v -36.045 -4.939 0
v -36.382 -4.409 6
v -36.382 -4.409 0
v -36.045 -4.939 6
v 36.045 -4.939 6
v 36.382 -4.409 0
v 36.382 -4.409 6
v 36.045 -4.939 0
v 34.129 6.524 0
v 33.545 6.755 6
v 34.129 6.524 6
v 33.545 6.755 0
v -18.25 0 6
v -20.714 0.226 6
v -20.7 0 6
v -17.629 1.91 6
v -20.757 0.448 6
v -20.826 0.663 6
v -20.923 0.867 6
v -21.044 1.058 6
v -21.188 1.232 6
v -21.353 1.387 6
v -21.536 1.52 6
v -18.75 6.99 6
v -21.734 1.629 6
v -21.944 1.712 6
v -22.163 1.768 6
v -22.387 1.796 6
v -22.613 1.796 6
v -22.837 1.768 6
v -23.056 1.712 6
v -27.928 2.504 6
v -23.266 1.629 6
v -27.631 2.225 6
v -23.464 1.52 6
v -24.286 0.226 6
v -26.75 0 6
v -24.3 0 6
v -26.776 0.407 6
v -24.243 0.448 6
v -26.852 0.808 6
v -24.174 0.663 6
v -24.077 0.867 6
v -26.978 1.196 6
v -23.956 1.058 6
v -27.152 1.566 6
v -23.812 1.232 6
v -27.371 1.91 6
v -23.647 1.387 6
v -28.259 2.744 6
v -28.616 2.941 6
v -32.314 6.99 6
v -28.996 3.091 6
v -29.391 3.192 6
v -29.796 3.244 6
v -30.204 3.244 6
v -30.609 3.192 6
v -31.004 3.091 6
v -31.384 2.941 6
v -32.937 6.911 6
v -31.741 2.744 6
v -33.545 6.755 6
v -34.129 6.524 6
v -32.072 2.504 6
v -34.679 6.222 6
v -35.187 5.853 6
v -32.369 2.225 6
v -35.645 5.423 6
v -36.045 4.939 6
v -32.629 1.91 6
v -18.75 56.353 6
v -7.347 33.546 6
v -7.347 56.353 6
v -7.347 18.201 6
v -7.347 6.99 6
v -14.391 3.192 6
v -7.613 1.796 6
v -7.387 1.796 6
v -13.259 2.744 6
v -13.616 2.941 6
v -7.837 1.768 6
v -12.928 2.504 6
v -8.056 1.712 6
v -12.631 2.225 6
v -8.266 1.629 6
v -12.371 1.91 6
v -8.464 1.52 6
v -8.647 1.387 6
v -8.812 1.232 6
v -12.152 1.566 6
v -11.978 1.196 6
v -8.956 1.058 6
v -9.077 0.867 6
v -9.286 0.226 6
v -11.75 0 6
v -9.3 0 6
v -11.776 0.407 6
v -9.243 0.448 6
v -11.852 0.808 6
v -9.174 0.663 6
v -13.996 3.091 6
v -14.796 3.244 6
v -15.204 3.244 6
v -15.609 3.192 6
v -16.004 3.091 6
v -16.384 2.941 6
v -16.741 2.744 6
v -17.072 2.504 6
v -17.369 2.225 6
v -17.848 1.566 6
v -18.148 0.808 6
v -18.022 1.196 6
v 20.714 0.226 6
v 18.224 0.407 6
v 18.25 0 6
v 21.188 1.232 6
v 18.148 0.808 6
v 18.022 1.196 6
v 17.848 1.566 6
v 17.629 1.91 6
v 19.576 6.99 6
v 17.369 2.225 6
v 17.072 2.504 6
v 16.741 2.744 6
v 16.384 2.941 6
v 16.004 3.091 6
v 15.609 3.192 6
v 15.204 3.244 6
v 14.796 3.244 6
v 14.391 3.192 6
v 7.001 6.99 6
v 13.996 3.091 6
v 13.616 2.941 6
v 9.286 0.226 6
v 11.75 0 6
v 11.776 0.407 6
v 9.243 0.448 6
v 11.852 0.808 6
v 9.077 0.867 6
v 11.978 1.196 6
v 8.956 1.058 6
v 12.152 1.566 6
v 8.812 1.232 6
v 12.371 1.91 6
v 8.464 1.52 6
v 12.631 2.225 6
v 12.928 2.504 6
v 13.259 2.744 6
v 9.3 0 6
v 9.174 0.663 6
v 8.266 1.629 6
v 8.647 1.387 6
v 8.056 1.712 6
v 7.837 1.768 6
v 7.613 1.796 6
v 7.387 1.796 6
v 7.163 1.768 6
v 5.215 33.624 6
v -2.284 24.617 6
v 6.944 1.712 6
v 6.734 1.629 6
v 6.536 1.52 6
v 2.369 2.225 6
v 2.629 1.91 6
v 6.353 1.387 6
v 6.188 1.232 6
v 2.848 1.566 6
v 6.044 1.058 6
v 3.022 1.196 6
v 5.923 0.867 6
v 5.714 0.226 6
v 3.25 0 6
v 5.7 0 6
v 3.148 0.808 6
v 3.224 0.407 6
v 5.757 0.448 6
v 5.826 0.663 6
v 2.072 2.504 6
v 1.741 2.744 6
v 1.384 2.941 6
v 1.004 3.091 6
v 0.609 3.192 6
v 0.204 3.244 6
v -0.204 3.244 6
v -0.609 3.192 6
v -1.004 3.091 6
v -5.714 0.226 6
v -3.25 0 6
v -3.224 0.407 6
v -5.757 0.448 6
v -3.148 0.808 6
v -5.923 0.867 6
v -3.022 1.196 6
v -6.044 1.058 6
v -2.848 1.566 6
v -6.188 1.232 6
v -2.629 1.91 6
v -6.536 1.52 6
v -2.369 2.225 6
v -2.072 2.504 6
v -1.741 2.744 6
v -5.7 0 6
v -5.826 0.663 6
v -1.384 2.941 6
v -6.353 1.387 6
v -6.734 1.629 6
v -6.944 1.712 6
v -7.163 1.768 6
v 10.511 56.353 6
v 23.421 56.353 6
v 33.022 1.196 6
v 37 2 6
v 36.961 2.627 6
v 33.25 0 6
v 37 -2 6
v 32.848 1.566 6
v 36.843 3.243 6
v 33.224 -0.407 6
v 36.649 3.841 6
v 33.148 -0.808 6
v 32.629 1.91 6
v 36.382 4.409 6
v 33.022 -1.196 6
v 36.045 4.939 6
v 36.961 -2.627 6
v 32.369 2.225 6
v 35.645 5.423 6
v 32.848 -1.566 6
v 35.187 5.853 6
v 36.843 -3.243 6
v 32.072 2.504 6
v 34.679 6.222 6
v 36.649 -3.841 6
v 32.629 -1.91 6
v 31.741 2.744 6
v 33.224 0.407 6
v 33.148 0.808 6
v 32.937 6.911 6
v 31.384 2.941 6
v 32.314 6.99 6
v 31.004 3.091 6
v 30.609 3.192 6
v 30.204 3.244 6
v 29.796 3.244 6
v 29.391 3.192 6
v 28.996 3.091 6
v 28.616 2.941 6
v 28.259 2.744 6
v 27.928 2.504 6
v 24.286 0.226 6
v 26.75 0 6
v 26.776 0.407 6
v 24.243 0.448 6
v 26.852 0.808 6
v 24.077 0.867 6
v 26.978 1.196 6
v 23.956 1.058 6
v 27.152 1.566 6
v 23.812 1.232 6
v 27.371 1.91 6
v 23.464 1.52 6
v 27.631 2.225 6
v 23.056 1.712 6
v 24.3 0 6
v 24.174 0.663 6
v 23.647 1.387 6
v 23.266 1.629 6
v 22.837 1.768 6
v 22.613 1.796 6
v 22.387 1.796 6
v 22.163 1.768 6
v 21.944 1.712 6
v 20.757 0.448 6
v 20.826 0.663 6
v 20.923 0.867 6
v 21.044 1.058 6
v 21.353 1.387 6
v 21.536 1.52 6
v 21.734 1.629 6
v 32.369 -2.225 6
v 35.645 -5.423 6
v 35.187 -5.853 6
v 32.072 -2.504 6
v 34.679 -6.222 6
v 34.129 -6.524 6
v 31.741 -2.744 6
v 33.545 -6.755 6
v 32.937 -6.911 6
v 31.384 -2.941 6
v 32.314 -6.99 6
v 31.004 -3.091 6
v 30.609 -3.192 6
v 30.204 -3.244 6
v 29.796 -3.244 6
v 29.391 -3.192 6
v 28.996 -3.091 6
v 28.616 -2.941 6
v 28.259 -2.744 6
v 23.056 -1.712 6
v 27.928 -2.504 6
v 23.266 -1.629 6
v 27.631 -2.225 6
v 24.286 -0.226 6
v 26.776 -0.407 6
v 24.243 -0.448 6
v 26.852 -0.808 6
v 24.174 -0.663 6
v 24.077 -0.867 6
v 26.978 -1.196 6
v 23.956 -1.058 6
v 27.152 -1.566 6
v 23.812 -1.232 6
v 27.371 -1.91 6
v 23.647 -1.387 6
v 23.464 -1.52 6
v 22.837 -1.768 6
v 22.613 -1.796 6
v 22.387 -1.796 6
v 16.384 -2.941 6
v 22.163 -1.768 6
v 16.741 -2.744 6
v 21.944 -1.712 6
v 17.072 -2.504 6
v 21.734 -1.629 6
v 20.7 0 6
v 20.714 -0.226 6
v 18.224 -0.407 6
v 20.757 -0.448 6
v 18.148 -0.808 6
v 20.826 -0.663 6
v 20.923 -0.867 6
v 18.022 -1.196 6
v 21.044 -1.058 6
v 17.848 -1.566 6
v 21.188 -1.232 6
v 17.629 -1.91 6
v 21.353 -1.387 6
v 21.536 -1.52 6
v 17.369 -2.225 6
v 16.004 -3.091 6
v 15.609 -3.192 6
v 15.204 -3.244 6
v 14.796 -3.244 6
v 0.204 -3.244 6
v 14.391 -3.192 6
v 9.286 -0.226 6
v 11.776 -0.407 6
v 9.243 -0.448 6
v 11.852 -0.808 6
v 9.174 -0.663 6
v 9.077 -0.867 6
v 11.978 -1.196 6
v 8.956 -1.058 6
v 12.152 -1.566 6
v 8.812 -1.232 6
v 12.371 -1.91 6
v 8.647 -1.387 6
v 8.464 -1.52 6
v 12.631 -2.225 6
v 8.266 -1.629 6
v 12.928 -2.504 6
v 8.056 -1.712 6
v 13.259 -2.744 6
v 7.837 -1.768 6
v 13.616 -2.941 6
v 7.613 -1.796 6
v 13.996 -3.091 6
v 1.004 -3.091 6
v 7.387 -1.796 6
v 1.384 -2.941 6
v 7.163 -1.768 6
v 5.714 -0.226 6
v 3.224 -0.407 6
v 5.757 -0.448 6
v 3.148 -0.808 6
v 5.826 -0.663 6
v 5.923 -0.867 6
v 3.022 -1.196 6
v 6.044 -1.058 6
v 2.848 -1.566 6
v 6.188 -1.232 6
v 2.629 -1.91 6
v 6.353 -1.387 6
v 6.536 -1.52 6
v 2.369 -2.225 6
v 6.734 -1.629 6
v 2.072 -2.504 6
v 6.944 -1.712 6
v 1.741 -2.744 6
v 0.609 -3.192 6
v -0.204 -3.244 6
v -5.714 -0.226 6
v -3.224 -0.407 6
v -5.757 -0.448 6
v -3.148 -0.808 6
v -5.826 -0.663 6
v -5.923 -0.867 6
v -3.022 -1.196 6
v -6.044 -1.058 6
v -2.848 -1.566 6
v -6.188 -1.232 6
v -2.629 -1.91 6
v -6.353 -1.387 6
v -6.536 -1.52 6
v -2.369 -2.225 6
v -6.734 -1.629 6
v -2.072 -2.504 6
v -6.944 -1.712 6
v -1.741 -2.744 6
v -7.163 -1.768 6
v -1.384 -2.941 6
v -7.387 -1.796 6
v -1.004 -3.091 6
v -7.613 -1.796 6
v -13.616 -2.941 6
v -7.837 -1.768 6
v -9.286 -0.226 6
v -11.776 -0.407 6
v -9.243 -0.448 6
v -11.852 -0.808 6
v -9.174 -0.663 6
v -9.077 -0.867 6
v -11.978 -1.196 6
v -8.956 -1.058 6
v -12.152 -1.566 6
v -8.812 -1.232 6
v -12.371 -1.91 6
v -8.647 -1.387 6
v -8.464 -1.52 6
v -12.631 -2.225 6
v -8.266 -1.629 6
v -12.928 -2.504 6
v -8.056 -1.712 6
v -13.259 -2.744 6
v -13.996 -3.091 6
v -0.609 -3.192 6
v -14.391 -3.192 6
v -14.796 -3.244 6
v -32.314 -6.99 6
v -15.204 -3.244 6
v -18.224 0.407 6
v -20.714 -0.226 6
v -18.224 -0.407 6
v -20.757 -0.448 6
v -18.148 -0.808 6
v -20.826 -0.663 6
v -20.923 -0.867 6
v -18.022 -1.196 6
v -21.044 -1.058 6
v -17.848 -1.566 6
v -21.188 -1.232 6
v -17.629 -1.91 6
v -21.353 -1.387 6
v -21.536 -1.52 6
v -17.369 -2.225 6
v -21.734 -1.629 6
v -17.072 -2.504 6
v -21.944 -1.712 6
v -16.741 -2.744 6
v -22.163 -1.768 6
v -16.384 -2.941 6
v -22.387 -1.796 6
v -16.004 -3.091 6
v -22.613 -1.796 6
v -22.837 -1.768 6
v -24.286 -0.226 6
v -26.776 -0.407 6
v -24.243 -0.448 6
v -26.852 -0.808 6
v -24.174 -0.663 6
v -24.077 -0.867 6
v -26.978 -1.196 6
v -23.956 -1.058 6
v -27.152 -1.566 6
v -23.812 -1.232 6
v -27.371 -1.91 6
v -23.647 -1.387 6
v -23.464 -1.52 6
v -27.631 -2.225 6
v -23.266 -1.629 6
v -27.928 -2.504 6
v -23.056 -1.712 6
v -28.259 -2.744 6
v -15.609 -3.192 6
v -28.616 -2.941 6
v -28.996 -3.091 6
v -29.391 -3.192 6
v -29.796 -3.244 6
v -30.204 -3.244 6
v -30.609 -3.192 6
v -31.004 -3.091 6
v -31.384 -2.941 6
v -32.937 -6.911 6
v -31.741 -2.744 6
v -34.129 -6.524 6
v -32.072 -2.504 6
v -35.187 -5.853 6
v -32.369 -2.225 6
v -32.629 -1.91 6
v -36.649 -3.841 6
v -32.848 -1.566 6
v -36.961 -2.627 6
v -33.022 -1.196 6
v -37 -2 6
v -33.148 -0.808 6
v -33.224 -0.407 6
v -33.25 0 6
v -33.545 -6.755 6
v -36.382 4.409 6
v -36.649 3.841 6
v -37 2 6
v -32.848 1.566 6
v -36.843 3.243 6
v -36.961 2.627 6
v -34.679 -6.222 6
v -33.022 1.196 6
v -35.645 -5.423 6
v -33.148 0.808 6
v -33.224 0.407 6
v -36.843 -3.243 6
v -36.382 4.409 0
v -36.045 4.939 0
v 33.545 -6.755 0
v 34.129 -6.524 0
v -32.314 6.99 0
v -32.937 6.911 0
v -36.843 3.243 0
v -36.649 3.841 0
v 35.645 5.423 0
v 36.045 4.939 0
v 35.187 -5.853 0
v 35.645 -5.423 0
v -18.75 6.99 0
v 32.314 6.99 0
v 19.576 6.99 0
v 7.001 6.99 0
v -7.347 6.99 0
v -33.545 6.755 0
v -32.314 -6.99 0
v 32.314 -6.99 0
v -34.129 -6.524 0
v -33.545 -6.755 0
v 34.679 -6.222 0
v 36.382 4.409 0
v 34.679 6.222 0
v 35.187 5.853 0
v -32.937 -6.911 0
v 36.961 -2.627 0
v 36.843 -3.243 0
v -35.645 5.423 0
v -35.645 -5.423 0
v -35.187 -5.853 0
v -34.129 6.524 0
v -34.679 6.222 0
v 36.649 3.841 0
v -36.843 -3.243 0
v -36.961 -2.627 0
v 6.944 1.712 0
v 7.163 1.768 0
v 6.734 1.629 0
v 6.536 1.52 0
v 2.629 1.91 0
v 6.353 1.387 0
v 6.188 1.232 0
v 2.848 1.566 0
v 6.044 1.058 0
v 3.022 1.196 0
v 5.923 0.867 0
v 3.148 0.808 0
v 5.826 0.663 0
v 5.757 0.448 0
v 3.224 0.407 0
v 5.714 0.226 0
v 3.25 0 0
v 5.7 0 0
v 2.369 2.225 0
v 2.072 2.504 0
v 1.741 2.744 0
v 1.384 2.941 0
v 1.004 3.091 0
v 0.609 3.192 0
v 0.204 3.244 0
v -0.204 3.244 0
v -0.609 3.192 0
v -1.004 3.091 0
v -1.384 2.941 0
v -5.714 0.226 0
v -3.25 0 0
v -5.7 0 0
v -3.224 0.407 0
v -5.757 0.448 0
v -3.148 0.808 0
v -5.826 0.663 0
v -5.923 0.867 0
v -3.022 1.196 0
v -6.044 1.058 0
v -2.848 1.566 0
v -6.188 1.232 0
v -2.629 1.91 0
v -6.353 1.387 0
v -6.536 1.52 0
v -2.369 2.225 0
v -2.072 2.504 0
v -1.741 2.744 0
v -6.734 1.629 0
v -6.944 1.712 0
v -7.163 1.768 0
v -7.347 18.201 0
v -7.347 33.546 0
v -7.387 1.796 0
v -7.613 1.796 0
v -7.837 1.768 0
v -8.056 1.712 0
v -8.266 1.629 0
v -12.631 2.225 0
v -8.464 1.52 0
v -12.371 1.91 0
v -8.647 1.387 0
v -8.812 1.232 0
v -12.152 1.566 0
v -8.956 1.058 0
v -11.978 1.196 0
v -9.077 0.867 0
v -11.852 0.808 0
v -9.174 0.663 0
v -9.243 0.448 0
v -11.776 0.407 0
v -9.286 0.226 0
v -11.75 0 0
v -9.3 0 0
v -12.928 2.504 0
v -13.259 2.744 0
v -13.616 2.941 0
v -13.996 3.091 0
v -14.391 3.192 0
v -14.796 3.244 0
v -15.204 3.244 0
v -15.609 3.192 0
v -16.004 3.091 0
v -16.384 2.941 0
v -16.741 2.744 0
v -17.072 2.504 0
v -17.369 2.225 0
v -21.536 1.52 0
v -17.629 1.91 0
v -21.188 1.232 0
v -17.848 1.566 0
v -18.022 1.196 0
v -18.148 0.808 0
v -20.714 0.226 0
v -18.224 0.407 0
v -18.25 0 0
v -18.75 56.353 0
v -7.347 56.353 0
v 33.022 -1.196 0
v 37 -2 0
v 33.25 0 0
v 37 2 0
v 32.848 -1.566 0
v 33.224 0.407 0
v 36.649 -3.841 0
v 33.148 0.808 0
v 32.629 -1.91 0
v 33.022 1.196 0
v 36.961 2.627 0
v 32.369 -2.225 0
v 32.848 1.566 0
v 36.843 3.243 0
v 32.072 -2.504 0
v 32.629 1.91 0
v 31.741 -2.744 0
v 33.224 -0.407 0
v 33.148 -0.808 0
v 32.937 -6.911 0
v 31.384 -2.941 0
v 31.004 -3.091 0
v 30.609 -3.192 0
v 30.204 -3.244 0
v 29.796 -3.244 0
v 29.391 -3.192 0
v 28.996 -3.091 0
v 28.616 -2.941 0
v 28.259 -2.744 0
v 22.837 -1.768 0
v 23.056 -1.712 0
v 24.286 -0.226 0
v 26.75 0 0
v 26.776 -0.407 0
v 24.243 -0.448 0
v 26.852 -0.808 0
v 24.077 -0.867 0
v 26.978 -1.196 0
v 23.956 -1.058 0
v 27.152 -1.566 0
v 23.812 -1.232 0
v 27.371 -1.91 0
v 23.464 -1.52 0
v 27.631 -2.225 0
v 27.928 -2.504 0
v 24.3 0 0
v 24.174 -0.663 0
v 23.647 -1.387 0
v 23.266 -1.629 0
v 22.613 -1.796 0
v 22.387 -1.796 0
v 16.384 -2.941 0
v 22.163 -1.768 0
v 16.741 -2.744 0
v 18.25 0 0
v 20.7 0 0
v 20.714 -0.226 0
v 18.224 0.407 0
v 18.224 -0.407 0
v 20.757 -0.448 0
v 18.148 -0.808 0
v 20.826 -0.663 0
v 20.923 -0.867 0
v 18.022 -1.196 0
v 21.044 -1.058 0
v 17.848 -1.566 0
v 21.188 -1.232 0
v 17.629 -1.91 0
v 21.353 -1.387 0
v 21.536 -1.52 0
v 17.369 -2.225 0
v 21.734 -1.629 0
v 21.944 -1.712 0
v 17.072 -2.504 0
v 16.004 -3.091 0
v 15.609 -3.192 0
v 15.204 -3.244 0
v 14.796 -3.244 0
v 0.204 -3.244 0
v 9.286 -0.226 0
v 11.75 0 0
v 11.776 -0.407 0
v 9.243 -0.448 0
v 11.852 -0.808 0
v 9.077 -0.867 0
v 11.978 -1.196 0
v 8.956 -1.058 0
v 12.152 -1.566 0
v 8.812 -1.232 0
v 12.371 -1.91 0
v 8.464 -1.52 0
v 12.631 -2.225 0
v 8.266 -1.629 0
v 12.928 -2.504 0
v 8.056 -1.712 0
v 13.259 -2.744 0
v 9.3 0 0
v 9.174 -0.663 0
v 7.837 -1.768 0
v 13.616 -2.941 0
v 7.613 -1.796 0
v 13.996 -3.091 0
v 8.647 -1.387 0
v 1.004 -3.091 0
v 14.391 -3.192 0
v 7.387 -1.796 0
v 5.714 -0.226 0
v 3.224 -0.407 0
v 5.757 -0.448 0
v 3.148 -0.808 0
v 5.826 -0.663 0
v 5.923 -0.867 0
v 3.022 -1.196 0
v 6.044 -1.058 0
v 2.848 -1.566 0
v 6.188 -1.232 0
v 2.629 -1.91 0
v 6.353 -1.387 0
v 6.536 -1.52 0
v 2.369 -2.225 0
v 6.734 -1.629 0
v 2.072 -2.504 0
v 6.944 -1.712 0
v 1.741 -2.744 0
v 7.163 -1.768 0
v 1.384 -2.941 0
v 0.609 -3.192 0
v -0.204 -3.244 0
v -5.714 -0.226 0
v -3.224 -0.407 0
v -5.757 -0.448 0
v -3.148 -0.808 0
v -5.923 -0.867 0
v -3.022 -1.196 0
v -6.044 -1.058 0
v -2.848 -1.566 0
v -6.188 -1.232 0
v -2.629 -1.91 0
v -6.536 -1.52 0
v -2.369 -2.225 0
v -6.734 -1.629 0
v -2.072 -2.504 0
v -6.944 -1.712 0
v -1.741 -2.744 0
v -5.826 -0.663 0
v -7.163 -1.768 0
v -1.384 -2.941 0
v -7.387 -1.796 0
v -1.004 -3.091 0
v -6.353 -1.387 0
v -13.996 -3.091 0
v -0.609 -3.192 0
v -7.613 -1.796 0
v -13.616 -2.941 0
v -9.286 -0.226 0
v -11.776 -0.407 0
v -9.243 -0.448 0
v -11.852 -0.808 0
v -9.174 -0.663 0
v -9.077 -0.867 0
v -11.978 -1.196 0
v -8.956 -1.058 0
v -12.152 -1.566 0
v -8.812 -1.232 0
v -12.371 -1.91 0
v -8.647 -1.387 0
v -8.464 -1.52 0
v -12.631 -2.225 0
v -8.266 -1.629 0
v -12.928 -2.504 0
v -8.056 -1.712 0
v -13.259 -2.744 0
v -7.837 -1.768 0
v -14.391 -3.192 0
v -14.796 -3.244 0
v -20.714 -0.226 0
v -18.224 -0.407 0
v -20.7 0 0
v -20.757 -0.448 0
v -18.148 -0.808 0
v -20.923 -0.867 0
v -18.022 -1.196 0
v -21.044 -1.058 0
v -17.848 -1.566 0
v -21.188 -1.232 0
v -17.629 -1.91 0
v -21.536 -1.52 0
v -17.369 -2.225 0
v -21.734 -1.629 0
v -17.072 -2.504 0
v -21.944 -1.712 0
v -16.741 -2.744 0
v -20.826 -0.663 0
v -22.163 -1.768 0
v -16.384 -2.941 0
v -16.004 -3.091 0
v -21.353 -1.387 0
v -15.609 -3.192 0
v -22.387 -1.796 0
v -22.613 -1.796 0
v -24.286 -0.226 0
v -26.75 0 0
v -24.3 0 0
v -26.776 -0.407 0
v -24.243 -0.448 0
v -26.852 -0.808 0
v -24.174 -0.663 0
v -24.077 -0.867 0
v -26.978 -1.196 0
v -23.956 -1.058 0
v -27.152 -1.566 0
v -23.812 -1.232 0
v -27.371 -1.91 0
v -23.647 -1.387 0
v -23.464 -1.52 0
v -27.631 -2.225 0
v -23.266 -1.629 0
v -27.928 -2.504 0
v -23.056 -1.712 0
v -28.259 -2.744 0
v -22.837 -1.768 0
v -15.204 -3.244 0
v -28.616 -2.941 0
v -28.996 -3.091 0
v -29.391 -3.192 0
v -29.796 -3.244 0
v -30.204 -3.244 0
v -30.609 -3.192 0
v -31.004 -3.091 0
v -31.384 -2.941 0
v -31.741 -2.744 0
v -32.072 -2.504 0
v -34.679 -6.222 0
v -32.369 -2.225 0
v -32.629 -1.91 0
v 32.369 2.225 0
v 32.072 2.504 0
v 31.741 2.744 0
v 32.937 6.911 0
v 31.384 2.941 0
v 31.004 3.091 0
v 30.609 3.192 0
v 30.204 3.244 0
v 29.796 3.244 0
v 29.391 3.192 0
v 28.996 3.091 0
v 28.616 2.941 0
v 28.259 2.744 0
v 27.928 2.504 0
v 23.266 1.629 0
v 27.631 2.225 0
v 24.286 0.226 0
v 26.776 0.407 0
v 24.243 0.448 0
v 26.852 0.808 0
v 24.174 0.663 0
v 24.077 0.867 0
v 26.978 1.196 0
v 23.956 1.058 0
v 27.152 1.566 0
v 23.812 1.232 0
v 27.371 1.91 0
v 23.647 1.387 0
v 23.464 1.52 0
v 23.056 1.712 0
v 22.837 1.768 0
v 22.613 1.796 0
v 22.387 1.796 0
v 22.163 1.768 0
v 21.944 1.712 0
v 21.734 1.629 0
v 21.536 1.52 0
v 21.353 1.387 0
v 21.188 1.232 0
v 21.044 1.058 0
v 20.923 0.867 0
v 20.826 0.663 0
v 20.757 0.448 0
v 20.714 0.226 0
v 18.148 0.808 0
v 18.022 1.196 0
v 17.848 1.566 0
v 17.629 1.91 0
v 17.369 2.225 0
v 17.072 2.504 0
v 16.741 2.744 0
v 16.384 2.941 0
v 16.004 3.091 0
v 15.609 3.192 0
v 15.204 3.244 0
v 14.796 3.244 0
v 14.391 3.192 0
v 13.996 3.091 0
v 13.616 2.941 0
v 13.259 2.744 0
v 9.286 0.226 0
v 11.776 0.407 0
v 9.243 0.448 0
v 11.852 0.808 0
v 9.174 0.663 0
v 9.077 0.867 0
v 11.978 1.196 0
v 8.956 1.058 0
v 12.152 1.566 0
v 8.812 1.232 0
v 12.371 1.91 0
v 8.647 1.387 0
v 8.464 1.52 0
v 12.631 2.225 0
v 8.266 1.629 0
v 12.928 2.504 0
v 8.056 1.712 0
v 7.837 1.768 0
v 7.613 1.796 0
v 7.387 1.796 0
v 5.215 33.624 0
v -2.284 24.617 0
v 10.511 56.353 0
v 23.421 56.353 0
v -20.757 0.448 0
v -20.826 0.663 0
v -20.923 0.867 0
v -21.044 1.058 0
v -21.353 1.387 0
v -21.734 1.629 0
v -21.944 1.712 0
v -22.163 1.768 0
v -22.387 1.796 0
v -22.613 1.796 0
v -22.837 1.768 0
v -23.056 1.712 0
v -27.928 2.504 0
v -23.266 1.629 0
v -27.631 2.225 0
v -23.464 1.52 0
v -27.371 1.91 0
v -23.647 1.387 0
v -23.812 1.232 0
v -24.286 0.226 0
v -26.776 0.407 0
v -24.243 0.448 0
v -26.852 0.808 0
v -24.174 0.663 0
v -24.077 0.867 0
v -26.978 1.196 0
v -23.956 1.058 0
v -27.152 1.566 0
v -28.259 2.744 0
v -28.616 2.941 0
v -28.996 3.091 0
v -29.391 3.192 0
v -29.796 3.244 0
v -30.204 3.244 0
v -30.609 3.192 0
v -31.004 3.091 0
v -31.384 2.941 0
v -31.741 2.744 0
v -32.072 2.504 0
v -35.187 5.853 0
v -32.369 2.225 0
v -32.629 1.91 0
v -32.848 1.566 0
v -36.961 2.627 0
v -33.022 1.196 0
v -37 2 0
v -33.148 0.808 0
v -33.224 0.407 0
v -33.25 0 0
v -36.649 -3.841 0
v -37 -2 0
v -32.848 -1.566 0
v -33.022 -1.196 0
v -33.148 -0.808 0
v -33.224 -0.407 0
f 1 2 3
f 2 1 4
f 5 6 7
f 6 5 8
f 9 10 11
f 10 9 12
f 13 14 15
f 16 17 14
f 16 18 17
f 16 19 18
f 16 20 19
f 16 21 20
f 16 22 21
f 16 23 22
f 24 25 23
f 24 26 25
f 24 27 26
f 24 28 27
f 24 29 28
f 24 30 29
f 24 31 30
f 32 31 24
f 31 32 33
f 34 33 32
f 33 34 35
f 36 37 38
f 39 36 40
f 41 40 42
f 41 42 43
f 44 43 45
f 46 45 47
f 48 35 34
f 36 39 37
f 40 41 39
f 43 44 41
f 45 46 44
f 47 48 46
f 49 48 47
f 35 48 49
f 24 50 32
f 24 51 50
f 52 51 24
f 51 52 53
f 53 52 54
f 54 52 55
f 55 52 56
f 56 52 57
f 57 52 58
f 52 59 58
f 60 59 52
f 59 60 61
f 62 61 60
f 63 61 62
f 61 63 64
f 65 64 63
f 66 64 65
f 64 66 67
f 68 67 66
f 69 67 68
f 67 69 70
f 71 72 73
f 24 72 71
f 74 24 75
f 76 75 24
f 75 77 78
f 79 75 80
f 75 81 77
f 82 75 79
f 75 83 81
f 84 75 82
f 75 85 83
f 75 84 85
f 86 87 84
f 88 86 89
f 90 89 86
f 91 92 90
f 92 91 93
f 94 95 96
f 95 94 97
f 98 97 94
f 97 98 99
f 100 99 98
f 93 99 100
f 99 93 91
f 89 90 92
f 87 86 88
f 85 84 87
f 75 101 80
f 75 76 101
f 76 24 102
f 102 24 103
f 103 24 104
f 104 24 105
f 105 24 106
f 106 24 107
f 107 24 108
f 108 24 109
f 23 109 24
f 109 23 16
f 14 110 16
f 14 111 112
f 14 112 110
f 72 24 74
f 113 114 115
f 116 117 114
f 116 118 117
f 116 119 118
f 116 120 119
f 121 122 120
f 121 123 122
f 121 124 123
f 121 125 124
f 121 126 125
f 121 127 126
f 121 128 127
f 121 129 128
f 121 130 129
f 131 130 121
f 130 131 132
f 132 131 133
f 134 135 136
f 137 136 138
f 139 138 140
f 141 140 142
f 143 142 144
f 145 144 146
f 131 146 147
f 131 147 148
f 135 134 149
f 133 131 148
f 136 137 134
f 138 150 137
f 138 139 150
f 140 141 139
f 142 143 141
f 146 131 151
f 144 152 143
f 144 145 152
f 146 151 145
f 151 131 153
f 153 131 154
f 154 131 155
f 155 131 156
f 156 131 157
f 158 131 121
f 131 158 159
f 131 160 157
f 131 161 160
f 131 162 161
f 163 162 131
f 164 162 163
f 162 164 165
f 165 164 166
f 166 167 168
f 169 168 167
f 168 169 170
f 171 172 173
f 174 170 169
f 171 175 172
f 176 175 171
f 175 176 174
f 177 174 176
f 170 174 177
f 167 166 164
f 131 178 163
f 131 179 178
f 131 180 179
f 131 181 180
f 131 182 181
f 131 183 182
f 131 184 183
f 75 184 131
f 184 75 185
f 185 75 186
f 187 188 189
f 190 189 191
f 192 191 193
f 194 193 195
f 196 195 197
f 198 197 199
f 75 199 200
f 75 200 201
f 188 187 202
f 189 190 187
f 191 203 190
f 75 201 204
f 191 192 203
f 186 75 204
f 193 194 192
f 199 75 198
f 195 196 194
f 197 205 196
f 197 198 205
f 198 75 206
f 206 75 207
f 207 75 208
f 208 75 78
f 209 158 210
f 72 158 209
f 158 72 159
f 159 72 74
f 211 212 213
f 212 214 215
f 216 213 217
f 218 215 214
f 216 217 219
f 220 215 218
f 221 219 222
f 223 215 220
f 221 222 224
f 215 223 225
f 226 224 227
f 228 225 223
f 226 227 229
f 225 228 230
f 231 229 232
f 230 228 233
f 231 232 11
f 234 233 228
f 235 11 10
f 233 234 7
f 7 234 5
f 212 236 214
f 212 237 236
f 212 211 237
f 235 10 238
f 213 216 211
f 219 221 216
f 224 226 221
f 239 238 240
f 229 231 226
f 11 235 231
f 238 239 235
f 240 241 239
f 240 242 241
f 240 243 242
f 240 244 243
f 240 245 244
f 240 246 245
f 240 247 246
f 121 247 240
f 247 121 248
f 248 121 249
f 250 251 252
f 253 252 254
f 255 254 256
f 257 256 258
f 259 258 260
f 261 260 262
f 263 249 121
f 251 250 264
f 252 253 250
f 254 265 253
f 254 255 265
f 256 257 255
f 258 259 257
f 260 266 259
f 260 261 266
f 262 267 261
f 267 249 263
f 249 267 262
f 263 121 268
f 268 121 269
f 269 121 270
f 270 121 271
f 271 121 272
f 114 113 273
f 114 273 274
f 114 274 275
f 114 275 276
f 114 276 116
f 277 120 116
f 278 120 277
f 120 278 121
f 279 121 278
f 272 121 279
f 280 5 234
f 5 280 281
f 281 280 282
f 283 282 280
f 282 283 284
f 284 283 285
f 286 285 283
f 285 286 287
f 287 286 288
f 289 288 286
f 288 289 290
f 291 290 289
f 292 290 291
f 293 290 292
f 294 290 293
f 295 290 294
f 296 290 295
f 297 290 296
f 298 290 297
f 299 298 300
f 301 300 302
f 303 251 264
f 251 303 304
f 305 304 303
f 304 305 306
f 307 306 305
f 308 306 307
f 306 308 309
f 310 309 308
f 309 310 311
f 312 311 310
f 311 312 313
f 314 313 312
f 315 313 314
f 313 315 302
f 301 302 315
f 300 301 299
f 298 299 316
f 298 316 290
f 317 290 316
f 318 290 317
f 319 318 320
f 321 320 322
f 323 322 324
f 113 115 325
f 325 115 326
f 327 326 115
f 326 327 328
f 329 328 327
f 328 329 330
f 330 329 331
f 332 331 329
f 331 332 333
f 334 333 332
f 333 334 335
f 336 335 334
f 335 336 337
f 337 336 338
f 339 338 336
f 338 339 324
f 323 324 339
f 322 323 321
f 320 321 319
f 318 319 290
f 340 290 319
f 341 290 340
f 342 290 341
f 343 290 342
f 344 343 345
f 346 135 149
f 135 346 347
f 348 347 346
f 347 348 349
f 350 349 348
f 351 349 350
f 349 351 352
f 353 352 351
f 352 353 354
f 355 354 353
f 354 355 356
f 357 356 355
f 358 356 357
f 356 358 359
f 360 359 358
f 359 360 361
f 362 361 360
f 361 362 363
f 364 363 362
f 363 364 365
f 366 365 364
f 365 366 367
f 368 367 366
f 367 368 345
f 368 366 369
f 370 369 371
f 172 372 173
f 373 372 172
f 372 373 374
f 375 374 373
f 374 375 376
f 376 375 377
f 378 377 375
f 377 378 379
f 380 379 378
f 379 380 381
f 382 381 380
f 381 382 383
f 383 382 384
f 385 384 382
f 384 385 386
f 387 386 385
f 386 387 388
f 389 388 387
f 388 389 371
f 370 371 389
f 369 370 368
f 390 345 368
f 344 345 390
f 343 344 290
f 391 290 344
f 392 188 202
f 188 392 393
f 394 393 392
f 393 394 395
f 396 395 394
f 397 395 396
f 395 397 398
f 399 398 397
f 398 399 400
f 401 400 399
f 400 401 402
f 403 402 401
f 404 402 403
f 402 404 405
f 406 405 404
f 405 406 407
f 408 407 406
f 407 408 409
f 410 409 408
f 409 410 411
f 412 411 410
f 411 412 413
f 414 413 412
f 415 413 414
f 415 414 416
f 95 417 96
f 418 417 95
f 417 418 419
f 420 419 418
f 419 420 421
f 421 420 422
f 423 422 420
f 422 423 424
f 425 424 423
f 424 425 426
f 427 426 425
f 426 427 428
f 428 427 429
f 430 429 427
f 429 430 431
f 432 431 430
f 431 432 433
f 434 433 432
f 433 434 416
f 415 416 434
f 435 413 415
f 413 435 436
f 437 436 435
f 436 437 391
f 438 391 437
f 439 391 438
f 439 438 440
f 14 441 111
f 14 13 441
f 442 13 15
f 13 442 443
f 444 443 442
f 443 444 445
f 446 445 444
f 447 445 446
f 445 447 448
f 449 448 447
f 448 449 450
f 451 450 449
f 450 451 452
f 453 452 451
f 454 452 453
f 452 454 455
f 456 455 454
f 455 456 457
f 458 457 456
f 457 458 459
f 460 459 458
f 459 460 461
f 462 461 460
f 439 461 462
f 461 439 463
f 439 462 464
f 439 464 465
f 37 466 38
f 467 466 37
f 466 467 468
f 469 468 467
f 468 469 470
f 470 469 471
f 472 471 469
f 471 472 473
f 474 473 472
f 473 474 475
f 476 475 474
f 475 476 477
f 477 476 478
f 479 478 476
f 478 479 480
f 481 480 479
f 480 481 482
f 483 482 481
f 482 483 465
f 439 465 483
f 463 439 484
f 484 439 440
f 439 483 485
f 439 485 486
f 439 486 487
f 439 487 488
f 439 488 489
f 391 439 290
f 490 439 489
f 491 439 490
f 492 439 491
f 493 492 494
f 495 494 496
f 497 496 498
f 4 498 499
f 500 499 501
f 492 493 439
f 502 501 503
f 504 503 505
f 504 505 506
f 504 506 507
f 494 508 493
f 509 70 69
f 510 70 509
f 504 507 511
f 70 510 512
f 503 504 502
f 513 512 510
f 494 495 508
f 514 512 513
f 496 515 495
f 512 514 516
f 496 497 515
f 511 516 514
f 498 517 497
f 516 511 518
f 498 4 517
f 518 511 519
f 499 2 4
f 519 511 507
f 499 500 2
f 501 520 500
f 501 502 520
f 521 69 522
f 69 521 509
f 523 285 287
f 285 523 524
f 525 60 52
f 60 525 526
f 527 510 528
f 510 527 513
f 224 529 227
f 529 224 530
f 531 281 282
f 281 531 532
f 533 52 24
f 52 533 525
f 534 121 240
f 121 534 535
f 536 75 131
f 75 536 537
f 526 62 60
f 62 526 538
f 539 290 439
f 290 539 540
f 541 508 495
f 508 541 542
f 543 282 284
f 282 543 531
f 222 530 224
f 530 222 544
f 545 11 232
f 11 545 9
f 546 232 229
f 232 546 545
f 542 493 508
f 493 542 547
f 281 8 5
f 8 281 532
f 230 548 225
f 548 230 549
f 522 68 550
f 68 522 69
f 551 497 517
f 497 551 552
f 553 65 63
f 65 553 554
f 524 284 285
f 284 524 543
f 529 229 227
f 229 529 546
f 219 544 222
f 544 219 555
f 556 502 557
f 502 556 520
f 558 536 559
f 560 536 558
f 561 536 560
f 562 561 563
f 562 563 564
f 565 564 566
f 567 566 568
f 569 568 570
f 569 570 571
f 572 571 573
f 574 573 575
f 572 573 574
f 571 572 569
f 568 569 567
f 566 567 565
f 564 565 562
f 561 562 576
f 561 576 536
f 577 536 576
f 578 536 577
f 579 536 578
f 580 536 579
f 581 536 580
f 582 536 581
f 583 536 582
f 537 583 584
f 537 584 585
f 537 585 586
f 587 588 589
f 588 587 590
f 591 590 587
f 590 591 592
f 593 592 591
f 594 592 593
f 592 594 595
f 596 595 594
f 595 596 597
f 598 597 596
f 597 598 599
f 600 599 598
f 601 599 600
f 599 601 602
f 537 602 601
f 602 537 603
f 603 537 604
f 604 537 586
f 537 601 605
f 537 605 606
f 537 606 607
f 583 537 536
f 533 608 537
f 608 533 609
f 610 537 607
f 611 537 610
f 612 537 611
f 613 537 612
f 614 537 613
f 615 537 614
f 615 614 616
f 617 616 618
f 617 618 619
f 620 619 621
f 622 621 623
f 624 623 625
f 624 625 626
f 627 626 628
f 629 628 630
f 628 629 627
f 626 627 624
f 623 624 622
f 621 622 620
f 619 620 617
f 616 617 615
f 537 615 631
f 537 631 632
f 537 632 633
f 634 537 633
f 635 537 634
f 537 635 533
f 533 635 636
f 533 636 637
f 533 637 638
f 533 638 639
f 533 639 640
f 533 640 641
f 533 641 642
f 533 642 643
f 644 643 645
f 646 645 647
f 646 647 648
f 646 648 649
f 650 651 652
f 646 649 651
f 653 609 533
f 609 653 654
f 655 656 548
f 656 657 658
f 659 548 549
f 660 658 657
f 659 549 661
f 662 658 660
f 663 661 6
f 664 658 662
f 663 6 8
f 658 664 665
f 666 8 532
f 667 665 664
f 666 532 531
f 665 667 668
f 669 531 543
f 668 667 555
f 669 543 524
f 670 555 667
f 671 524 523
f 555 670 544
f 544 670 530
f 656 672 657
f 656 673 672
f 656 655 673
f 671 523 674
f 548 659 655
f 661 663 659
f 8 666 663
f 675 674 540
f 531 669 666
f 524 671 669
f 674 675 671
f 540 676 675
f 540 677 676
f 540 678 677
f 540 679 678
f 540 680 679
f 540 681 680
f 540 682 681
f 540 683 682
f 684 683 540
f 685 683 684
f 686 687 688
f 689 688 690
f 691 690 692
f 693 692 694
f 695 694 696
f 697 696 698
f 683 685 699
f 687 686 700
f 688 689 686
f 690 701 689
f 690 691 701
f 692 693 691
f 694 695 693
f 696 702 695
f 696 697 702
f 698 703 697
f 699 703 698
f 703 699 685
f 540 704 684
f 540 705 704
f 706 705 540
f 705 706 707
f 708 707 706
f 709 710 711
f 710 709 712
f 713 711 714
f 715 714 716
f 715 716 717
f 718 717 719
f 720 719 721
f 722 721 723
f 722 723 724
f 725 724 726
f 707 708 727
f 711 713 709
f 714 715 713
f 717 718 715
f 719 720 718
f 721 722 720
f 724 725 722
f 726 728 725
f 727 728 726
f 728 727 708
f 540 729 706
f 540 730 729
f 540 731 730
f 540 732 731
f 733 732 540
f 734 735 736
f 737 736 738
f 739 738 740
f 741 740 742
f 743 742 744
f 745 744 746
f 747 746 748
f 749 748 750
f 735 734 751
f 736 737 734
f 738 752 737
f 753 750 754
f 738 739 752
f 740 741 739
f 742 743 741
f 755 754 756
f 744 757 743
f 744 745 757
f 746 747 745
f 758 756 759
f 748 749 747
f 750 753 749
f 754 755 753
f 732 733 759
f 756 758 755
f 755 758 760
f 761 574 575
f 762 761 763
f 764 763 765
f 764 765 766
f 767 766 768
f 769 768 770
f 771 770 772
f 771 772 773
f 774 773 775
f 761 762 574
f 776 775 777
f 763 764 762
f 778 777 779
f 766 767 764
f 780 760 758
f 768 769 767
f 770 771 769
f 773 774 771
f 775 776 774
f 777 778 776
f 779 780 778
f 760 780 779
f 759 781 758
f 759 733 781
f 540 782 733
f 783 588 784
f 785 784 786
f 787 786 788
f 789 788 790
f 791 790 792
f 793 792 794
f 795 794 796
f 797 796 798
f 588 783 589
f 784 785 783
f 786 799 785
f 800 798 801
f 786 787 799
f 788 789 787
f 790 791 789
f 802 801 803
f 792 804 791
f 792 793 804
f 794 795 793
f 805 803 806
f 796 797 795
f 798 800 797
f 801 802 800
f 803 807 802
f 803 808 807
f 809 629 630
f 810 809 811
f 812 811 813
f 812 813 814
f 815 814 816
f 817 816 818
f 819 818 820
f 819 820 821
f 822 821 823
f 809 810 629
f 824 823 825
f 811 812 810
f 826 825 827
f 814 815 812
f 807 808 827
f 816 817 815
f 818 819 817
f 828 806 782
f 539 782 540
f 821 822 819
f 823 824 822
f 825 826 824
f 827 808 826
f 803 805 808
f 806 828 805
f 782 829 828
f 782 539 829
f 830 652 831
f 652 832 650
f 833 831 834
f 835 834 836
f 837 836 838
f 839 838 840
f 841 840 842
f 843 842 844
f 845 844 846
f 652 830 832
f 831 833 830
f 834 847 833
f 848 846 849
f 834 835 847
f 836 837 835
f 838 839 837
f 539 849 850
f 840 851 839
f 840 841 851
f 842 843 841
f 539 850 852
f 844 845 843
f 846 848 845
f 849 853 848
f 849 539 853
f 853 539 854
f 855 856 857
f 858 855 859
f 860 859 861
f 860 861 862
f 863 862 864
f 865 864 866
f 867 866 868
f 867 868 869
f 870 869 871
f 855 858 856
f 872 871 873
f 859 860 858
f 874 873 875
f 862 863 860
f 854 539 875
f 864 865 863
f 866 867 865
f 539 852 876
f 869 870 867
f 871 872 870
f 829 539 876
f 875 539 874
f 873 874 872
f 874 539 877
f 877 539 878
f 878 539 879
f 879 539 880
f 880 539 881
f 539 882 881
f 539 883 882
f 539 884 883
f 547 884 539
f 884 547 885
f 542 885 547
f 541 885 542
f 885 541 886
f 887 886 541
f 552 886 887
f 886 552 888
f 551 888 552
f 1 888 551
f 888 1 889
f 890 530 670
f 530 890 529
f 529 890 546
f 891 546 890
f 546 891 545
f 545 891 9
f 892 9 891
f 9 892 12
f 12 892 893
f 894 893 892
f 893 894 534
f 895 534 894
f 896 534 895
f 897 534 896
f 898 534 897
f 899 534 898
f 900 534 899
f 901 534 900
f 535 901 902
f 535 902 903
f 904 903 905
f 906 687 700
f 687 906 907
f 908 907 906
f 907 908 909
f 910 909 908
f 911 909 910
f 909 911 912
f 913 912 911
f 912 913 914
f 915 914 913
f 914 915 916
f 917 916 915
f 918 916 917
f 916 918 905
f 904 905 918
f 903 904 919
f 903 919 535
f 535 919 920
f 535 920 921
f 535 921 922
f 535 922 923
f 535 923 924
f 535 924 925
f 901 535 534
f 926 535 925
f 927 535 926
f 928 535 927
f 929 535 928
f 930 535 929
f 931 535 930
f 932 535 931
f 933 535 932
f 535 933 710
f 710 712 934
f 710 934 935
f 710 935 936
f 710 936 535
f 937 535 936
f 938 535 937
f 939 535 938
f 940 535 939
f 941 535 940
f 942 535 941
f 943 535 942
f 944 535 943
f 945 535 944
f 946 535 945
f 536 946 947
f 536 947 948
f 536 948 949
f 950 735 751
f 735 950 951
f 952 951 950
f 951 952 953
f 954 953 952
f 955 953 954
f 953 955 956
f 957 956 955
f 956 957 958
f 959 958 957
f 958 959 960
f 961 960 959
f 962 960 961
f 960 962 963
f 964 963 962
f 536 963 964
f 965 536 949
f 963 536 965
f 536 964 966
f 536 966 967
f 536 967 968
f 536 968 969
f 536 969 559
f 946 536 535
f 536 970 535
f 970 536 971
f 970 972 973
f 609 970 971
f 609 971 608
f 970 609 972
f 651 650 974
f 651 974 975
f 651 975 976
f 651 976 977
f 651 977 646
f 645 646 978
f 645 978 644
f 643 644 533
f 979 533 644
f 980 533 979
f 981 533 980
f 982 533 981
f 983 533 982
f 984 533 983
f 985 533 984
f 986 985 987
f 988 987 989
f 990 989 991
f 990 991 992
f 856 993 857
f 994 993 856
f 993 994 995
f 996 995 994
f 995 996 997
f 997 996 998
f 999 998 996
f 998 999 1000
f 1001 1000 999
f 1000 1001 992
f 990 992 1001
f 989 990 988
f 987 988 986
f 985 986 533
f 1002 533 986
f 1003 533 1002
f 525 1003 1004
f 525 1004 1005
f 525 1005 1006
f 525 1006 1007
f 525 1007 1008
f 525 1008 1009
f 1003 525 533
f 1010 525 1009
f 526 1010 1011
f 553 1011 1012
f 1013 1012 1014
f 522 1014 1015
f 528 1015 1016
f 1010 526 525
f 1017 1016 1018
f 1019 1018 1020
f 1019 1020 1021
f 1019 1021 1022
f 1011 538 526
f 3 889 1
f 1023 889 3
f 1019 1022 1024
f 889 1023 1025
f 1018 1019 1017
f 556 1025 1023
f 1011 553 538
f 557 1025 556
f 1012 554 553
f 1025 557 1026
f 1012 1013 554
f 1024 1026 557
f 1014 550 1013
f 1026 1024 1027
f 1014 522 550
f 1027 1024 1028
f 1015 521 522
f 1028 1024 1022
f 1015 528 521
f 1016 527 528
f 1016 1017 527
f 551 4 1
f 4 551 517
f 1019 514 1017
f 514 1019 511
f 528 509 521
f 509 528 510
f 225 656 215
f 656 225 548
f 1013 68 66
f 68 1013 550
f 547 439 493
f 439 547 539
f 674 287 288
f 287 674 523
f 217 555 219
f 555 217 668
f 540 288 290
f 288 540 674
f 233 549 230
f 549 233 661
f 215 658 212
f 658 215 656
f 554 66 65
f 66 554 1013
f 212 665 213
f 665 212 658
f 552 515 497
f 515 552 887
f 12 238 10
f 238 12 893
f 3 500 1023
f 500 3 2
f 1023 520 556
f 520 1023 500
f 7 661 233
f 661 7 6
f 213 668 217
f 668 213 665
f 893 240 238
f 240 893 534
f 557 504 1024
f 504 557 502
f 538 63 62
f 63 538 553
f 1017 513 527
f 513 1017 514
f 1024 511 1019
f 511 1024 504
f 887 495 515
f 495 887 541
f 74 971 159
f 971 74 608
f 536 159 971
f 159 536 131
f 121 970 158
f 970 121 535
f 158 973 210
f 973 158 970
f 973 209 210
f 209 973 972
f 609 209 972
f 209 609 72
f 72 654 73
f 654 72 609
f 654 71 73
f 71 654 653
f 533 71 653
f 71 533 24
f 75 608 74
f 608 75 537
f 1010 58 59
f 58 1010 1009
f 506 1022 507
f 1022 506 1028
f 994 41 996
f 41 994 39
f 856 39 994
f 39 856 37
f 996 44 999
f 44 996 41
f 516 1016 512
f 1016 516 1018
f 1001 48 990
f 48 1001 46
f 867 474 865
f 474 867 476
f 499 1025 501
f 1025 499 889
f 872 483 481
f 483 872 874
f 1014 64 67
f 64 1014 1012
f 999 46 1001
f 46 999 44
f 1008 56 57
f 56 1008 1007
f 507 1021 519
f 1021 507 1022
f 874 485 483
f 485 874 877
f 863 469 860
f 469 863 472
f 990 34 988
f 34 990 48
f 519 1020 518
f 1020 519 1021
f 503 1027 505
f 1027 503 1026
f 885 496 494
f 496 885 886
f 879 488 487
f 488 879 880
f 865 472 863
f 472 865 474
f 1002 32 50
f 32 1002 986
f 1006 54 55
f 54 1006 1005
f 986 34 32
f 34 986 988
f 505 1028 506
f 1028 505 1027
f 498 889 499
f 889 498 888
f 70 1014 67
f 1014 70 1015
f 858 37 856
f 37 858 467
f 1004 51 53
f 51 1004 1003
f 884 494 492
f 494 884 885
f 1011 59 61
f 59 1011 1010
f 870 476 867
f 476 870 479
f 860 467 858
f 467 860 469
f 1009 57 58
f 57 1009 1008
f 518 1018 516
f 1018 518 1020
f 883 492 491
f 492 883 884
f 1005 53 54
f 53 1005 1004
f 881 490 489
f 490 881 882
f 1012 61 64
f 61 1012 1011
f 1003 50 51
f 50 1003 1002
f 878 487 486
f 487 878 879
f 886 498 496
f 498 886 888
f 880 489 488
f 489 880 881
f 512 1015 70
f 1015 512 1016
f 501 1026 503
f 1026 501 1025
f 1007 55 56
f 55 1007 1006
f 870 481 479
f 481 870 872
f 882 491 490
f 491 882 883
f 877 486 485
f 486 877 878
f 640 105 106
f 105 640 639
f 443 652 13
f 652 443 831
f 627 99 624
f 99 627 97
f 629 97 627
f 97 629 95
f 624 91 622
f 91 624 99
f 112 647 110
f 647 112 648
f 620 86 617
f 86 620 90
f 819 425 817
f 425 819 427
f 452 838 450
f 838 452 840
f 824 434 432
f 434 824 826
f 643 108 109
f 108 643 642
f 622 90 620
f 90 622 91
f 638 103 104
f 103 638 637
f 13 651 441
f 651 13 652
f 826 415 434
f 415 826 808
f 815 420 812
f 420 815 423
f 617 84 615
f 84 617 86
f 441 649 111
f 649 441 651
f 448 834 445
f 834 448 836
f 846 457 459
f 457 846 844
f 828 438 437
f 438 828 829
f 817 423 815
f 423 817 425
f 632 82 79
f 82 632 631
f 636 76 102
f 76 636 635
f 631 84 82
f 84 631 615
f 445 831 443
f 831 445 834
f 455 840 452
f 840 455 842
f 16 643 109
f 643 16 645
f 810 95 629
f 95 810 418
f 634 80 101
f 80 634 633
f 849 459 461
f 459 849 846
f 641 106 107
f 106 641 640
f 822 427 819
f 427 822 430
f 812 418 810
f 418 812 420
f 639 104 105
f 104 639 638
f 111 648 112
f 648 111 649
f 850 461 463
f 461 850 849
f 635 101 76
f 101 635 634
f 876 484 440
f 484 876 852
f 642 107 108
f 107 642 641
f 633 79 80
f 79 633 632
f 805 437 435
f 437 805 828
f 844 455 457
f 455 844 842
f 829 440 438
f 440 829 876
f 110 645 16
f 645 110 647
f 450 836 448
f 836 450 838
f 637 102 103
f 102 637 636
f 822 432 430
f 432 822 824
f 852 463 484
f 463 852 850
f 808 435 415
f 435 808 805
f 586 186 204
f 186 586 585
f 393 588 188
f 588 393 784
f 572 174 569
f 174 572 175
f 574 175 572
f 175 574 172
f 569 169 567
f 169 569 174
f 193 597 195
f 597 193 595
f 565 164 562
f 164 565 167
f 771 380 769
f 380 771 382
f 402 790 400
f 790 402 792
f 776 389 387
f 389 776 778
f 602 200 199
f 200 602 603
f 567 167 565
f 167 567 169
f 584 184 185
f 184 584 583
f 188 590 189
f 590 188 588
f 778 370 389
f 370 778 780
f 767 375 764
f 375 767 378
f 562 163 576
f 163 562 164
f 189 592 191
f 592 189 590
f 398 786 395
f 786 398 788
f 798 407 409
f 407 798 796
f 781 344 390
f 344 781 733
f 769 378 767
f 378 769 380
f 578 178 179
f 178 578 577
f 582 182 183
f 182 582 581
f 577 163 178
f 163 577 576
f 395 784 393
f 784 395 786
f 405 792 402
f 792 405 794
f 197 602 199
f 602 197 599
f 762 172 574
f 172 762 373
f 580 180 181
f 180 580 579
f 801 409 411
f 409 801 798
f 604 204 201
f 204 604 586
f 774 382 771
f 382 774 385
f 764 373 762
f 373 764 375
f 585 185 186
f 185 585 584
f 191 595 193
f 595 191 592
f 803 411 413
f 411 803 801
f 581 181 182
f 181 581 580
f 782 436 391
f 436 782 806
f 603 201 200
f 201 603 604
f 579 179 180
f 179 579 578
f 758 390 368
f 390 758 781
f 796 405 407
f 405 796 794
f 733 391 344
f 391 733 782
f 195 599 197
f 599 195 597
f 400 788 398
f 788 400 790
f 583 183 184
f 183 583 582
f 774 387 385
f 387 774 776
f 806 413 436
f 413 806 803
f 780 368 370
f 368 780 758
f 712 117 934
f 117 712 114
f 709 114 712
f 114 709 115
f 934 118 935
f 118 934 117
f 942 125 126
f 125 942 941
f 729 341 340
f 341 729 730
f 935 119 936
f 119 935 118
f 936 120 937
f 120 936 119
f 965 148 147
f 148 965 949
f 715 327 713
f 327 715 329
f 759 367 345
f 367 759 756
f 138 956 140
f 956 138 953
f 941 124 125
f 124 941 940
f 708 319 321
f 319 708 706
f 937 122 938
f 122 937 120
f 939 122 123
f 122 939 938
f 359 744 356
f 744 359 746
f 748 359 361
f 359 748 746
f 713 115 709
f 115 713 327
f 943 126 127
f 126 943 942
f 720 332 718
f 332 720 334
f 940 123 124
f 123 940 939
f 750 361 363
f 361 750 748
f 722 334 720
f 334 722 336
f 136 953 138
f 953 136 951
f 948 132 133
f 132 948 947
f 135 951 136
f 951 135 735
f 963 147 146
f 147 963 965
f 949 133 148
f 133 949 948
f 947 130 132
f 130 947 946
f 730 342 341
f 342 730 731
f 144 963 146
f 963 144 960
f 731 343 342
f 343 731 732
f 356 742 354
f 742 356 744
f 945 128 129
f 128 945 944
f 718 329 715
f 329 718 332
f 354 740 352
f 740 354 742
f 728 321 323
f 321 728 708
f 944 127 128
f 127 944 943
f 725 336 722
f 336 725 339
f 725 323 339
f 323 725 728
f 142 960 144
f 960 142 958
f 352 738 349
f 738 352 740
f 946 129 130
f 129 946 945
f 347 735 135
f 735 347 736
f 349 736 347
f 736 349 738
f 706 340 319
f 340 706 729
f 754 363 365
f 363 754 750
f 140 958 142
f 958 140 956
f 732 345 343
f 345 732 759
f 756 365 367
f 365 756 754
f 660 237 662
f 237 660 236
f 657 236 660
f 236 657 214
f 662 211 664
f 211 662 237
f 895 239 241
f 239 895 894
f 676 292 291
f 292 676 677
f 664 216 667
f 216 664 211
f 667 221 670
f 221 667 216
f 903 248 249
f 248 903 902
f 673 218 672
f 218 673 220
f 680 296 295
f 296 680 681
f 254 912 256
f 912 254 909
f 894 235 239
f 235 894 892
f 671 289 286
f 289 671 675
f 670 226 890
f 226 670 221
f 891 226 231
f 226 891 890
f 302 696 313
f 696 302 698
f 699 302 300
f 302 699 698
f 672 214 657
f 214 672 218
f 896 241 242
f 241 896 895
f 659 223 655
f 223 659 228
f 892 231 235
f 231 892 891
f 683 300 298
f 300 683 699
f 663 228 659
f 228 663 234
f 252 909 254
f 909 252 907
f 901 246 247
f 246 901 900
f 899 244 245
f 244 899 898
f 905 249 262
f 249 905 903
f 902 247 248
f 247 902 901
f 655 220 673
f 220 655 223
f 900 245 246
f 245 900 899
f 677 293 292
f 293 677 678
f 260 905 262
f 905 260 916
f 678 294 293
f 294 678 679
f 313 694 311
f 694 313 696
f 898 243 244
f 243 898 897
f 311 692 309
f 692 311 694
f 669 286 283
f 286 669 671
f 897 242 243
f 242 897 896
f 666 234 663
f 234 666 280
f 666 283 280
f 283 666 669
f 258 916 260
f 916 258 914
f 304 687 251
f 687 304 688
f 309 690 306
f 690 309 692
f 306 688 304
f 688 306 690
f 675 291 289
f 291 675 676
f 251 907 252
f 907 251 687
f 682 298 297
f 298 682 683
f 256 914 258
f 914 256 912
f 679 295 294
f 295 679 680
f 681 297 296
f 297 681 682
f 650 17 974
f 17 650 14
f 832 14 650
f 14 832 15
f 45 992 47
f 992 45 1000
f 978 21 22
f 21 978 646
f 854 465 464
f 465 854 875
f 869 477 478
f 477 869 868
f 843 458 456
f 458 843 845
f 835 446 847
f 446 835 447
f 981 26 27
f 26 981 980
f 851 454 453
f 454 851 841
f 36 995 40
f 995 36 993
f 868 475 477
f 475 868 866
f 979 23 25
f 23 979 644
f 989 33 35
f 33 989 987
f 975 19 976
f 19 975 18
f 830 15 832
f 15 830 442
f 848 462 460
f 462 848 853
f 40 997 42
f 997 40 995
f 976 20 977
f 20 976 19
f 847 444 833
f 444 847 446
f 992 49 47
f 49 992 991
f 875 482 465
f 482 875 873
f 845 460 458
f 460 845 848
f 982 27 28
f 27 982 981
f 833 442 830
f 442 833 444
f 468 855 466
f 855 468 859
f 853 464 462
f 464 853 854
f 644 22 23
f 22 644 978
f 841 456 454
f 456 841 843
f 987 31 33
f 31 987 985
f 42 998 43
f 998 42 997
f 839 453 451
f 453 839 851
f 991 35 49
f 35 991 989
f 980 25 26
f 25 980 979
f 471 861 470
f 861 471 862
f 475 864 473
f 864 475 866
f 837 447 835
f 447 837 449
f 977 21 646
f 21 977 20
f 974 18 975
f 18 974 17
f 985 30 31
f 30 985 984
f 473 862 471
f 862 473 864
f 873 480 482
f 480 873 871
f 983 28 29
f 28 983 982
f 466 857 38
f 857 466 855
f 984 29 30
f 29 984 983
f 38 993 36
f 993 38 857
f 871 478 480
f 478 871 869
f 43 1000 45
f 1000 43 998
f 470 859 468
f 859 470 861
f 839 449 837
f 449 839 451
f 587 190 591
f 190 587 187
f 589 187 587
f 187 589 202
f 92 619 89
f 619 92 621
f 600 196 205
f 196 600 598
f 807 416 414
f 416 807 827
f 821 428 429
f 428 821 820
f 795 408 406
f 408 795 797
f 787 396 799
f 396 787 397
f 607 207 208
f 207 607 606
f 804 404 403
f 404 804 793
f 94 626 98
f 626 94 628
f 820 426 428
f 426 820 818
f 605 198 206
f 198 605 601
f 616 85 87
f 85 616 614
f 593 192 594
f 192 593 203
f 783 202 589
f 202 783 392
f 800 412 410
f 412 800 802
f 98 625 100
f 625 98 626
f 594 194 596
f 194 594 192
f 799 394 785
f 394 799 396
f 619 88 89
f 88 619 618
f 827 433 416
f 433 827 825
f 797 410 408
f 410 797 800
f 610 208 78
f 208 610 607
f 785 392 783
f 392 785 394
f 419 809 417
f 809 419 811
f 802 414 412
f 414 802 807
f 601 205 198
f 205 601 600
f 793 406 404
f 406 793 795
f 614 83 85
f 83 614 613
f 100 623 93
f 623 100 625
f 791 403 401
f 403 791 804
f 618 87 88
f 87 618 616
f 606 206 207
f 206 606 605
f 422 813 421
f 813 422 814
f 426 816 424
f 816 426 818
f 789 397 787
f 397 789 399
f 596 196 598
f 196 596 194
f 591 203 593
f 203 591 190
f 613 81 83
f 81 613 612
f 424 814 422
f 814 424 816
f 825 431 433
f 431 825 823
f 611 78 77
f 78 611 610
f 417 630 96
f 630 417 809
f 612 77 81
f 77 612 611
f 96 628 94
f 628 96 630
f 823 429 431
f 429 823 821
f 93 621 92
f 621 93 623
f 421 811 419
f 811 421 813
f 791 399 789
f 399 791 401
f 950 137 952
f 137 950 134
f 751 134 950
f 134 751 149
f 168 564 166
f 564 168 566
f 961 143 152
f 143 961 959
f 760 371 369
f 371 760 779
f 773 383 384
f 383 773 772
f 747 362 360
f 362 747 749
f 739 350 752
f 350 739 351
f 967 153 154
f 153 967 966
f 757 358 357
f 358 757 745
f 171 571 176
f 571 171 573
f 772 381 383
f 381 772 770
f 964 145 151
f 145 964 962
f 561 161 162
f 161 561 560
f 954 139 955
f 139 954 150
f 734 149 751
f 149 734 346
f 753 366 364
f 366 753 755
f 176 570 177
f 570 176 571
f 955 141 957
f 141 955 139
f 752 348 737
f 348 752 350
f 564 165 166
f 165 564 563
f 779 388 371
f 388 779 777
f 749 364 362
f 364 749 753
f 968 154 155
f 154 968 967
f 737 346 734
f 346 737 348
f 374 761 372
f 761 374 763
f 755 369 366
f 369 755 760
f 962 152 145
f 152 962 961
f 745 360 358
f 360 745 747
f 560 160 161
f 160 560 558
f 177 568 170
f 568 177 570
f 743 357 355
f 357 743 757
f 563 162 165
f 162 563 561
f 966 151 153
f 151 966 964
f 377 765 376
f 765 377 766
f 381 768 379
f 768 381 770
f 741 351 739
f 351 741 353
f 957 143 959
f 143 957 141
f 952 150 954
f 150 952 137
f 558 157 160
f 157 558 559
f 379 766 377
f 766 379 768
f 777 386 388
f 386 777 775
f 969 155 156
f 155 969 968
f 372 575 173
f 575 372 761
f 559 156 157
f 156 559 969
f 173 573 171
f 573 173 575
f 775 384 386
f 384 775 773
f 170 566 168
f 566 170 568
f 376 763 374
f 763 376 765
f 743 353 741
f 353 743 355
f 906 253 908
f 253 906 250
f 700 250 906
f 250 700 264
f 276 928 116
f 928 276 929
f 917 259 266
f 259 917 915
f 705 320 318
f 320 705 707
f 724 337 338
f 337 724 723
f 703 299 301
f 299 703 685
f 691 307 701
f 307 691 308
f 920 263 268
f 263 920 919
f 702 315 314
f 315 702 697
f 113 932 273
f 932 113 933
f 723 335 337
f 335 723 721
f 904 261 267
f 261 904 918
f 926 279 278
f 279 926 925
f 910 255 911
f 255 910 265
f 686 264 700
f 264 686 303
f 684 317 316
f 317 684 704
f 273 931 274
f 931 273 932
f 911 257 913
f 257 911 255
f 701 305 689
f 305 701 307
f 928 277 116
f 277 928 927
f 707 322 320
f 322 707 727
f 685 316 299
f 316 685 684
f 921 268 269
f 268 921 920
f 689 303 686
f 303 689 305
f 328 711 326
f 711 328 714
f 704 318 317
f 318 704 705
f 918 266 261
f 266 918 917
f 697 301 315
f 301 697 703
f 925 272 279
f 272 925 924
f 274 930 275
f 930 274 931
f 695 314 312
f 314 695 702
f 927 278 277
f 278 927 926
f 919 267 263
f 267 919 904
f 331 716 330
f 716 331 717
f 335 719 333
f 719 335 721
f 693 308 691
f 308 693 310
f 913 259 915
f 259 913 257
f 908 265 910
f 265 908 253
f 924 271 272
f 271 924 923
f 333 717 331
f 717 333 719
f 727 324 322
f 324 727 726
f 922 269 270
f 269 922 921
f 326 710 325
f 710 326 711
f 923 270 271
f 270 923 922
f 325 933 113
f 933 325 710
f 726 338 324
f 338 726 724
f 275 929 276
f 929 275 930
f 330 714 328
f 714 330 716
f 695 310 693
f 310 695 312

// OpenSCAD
$fn = 50;


difference() {
	union() {
		hull() {
			translate(v = [-32.0000000000, 2.0000000000, 0]) {
				cylinder(h = 6, r = 5);
			}
			translate(v = [32.0000000000, 2.0000000000, 0]) {
				cylinder(h = 6, r = 5);
			}
			translate(v = [-32.0000000000, -2.0000000000, 0]) {
				cylinder(h = 6, r = 5);
			}
			translate(v = [32.0000000000, -2.0000000000, 0]) {
				cylinder(h = 6, r = 5);
			}
		}
		translate(v = [0, 55, 0]) {
			linear_extrude(height = 6) {
				text(font = "DejaVu Sans Mono:style=Bold", halign = "center", size = 57.0000000000, text = "K", valign = "top");
			}
		}
	}
	union() {
		translate(v = [-30.0000000000, 0.0000000000, 0]) {
			translate(v = [0, 0, -100]) {
				cylinder(h = 200, r = 3.2500000000);
			}
		}
		translate(v = [-15.0000000000, 0.0000000000, 0]) {
			translate(v = [0, 0, -100]) {
				cylinder(h = 200, r = 3.2500000000);
			}
		}
		translate(v = [0, 0, -100]) {
			cylinder(h = 200, r = 3.2500000000);
		}
		translate(v = [15.0000000000, 0.0000000000, 0]) {
			translate(v = [0, 0, -100]) {
				cylinder(h = 200, r = 3.2500000000);
			}
		}
		translate(v = [30.0000000000, 0.0000000000, 0]) {
			translate(v = [0, 0, -100]) {
				cylinder(h = 200, r = 3.2500000000);
			}
		}
		translate(v = [-30.0000000000, 0.0000000000, 0]) {
			translate(v = [0, 0, -100]) {
				cylinder(h = 200, r = 1.8000000000);
			}
		}
		translate(v = [-22.5000000000, 0.0000000000, 0]) {
			translate(v = [0, 0, -100]) {
				cylinder(h = 200, r = 1.8000000000);
			}
		}
		translate(v = [-15.0000000000, 0.0000000000, 0]) {
			translate(v = [0, 0, -100]) {
				cylinder(h = 200, r = 1.8000000000);
			}
		}
		translate(v = [-7.5000000000, 0.0000000000, 0]) {
			translate(v = [0, 0, -100]) {
				cylinder(h = 200, r = 1.8000000000);
			}
		}
		translate(v = [0, 0, -100]) {
			cylinder(h = 200, r = 1.8000000000);
		}
		translate(v = [7.5000000000, 0.0000000000, 0]) {
			translate(v = [0, 0, -100]) {
				cylinder(h = 200, r = 1.8000000000);
			}
		}
		translate(v = [15.0000000000, 0.0000000000, 0]) {
			translate(v = [0, 0, -100]) {
				cylinder(h = 200, r = 1.8000000000);
			}
		}
		translate(v = [22.5000000000, 0.0000000000, 0]) {
			translate(v = [0, 0, -100]) {
				cylinder(h = 200, r = 1.8000000000);
			}
		}
		translate(v = [30.0000000000, 0.0000000000, 0]) {
			translate(v = [0, 0, -100]) {
				cylinder(h = 200, r = 1.8000000000);
			}
		}
	}
}
